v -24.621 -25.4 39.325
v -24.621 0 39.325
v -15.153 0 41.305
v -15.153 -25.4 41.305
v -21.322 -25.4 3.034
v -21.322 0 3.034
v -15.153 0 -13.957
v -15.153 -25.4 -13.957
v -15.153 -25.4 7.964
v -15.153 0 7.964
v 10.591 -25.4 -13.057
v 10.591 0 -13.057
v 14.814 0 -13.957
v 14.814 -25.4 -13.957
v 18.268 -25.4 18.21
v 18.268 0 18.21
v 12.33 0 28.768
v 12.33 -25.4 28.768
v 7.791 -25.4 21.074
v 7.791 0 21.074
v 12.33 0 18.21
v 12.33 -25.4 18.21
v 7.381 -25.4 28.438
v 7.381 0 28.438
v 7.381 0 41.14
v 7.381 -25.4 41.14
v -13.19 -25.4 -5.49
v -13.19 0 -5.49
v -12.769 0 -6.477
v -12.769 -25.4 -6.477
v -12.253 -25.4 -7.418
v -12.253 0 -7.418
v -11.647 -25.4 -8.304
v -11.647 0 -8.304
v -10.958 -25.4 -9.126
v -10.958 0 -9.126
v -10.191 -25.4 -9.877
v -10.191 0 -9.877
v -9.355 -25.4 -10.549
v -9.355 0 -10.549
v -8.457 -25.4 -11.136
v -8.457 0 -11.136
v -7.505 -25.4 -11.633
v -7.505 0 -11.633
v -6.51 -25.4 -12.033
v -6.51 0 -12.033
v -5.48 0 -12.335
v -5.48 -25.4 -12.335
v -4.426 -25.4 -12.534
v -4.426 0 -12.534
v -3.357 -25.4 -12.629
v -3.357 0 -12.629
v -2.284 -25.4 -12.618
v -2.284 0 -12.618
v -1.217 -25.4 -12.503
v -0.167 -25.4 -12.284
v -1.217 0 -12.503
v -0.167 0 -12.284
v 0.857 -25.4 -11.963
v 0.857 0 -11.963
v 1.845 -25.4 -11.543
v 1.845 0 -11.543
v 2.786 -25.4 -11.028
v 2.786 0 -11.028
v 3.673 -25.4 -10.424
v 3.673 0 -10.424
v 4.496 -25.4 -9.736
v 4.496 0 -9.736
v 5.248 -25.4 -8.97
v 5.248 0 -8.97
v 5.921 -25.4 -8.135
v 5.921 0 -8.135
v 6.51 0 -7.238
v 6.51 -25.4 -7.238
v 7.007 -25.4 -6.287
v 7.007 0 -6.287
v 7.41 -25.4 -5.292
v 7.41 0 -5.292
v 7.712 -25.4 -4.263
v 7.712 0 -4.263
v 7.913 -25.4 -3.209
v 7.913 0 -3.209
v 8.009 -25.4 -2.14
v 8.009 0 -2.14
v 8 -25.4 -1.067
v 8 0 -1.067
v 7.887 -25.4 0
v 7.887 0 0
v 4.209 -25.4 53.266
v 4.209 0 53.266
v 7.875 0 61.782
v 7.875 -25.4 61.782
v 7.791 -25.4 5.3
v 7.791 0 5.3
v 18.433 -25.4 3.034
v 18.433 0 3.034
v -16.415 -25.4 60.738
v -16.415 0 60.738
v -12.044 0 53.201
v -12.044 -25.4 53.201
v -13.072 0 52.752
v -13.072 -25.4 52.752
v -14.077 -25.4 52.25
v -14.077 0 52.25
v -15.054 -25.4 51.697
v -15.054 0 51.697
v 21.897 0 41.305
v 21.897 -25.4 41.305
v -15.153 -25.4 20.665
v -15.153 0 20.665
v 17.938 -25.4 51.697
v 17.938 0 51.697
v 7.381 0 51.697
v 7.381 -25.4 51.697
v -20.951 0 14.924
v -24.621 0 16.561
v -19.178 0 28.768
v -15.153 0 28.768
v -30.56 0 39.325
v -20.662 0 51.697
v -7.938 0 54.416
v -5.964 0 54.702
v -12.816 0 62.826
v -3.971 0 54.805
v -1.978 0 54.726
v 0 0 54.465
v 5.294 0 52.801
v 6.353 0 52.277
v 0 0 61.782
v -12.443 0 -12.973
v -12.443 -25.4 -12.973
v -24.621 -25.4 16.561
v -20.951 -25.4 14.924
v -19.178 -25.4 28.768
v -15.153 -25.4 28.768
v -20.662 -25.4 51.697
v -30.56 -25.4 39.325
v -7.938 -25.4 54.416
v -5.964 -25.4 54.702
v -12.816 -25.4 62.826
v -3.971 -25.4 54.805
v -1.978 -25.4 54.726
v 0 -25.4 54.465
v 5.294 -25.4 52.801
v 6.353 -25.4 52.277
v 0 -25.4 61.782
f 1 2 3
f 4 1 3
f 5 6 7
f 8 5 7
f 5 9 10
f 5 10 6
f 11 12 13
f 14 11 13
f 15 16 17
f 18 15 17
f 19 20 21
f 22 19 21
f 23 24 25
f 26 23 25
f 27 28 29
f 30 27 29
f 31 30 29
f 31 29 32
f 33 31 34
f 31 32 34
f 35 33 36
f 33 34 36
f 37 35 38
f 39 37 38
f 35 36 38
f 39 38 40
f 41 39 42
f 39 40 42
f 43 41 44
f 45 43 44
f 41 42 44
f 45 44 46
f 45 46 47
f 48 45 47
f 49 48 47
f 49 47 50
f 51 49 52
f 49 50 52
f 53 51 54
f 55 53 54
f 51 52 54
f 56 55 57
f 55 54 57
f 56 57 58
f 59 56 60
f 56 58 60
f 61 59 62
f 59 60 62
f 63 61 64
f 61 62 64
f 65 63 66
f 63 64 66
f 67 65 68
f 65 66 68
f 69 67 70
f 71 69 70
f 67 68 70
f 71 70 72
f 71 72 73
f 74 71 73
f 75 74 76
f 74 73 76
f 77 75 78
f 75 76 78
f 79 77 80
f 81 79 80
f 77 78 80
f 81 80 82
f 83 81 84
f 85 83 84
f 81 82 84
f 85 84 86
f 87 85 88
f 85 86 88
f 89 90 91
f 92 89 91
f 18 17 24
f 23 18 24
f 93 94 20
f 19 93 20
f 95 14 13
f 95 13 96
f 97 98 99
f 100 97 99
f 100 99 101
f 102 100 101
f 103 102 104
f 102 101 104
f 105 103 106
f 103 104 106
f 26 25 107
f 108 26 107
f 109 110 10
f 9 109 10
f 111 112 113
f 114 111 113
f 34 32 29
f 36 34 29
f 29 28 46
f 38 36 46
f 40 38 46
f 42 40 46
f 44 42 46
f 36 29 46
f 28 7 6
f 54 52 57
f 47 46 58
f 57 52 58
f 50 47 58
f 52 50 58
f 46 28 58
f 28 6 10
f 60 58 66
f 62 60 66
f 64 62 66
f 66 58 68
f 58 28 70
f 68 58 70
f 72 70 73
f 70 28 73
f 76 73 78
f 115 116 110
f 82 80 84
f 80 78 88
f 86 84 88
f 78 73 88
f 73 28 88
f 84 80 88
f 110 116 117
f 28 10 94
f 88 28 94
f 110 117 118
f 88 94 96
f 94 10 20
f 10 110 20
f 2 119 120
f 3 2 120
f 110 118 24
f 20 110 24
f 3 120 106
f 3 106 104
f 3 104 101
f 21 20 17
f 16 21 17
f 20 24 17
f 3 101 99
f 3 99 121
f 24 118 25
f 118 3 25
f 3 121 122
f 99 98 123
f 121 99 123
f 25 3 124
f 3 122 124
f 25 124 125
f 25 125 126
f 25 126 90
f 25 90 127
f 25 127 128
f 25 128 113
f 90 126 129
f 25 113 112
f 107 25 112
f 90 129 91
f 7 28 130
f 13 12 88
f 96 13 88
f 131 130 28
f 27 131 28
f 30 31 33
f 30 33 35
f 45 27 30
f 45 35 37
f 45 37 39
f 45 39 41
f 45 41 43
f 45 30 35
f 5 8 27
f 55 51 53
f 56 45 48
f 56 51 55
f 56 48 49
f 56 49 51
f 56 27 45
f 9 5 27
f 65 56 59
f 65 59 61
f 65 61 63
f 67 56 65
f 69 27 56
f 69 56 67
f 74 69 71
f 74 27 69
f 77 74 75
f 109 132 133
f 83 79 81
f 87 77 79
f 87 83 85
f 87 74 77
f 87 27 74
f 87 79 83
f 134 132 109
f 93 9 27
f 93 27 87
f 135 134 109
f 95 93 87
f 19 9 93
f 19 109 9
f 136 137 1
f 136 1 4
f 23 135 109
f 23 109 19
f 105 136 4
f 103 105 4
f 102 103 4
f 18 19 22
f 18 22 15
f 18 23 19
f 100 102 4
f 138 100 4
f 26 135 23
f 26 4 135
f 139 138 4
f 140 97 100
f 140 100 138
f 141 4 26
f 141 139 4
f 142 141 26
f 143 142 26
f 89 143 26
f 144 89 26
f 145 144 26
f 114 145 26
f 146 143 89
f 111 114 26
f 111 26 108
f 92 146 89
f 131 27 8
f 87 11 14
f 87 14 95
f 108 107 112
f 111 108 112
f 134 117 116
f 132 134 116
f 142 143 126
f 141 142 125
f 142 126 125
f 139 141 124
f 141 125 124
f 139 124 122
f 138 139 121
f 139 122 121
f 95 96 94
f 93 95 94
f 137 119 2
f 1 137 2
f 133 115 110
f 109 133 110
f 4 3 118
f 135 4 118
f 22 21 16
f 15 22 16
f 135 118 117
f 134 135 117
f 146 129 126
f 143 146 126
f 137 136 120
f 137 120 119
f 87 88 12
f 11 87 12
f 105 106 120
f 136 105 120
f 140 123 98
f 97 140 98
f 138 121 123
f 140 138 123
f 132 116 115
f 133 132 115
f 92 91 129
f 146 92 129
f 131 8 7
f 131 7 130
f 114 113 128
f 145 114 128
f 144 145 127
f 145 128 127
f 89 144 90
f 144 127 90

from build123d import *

# Parameters (mm, degrees)
F1_DEPTH = 25.4


with BuildPart() as f1:
    # F0 (on Front) → F1 (new body)
    with BuildSketch(Plane.XZ):
        with BuildLine():
            Line((-12.4426856389, -12.9730125086), (-13.1896968379, -5.4903274543))
            ThreePointArc((-13.1896968379, -5.4903274543), (-0.1668346208, -12.2836148574), (7.8865187243, 0))
            Line((7.8865187243, 0), (10.5906810166, -13.0574683954))
            Line((10.5906810166, -13.0574683954), (14.8144917242, -13.957073912))
            Line((14.8144917242, -13.957073912), (18.4332933277, 3.033854533))
            Line((18.4332933277, 3.033854533), (7.791120559, 5.3004706278))
            Line((7.791120559, 5.3004706278), (7.791120559, 21.074494347))
            Line((7.791120559, 21.074494347), (12.3297581449, 18.2102192193))
            Line((12.3297581449, 18.2102192193), (18.2683356106, 18.2102192193))
            Line((18.2683356106, 18.2102192193), (12.3297581449, 28.7676900625))
            Line((12.3297581449, 28.7676900625), (7.380944211, 28.4377671778))
            Line((7.380944211, 28.4377671778), (7.380944211, 41.1397255957))
            Line((7.380944211, 41.1397255957), (21.8974649906, 41.3046851754))
            Line((21.8974649906, 41.3046851754), (17.9384145886, 51.6971945763))
            Line((17.9384145886, 51.6971945763), (7.380944211, 51.6971945763))
            ThreePointArc((7.380944211, 51.6971945763), (5.8269963178, 52.5462179029), (4.209248367, 53.2662777833))
            ThreePointArc((4.209248367, 53.2662777833), (2.1348058911, 53.9718233781), (0, 54.4654932873))
            ThreePointArc((0, 54.4654932873), (-3.971449067, 54.80540535), (-7.938379177, 54.4162865973))
            ThreePointArc((-7.938379177, 54.4162865973), (-10.0209611702, 53.9098413782), (-12.0437239792, 53.2012758293))
            ThreePointArc((-12.0437239792, 53.2012758293), (-13.577773448, 52.5074144495), (-15.053678304, 51.6971945763))
            Line((-15.053678304, 51.6971945763), (-20.6623356789, 51.6971945763))
            Line((-20.6623356789, 51.6971945763), (-30.5599626154, 39.3251590431))
            Line((-30.5599626154, 39.3251590431), (-24.621386081, 39.3251590431))
            Line((-24.621386081, 39.3251590431), (-15.1529135182, 41.3046851754))
            Line((-15.1529135182, 41.3046851754), (-15.1529135182, 28.7676900625))
            Line((-15.1529135182, 28.7676900625), (-19.177692011, 28.7676900625))
            Line((-19.177692011, 28.7676900625), (-24.621386081, 16.560614109))
            Line((-24.621386081, 16.560614109), (-20.9508969498, 14.9237749517))
            Line((-20.9508969498, 14.9237749517), (-15.1529135182, 20.6647776067))
            Line((-15.1529135182, 20.6647776067), (-15.1529135182, 7.9636173323))
            Line((-15.1529135182, 7.9636173323), (-21.3221795857, 3.033854533))
            Line((-21.3221795857, 3.033854533), (-15.1529135182, -13.957073912))
            Line((-15.1529135182, -13.957073912), (-12.4426856389, -12.9730125086))
        make_face()
        with BuildLine():
            ThreePointArc((-13.1896968379, -5.4903274543), (-13.8154393629, -2.7802733754), (-13.7378070503, 0))
            Line((-13.7378070503, 0), (-13.1896968379, -5.4903274543))
        make_face(mode=Mode.SUBTRACT)
        with BuildLine():
            ThreePointArc((0, 54.4654932873), (2.1348058911, 53.9718233781), (4.209248367, 53.2662777833))
            Line((4.209248367, 53.2662777833), (7.8750308603, 61.7822111755))
            Line((7.8750308603, 61.7822111755), (0, 61.7822111755))
            Line((0, 61.7822111755), (0, 54.4654932873))
        make_face()
        with BuildLine():
            Line((-16.4149385959, 60.7384818016), (-12.0437239792, 53.2012758293))
            ThreePointArc((-12.0437239792, 53.2012758293), (-10.0209611702, 53.9098413782), (-7.938379177, 54.4162865973))
            Line((-7.938379177, 54.4162865973), (-12.8155713901, 62.8259405494))
            Line((-12.8155713901, 62.8259405494), (-16.4149385959, 60.7384818016))
        make_face()
        with BuildLine():
            Line((-13.1896968379, -5.4903274543), (-13.7378070503, 0))
            ThreePointArc((-13.7378070503, 0), (-13.8154393629, -2.7802733754), (-13.1896968379, -5.4903274543))
        make_face()
    extrude(amount=F1_DEPTH)


solid = f1.part
